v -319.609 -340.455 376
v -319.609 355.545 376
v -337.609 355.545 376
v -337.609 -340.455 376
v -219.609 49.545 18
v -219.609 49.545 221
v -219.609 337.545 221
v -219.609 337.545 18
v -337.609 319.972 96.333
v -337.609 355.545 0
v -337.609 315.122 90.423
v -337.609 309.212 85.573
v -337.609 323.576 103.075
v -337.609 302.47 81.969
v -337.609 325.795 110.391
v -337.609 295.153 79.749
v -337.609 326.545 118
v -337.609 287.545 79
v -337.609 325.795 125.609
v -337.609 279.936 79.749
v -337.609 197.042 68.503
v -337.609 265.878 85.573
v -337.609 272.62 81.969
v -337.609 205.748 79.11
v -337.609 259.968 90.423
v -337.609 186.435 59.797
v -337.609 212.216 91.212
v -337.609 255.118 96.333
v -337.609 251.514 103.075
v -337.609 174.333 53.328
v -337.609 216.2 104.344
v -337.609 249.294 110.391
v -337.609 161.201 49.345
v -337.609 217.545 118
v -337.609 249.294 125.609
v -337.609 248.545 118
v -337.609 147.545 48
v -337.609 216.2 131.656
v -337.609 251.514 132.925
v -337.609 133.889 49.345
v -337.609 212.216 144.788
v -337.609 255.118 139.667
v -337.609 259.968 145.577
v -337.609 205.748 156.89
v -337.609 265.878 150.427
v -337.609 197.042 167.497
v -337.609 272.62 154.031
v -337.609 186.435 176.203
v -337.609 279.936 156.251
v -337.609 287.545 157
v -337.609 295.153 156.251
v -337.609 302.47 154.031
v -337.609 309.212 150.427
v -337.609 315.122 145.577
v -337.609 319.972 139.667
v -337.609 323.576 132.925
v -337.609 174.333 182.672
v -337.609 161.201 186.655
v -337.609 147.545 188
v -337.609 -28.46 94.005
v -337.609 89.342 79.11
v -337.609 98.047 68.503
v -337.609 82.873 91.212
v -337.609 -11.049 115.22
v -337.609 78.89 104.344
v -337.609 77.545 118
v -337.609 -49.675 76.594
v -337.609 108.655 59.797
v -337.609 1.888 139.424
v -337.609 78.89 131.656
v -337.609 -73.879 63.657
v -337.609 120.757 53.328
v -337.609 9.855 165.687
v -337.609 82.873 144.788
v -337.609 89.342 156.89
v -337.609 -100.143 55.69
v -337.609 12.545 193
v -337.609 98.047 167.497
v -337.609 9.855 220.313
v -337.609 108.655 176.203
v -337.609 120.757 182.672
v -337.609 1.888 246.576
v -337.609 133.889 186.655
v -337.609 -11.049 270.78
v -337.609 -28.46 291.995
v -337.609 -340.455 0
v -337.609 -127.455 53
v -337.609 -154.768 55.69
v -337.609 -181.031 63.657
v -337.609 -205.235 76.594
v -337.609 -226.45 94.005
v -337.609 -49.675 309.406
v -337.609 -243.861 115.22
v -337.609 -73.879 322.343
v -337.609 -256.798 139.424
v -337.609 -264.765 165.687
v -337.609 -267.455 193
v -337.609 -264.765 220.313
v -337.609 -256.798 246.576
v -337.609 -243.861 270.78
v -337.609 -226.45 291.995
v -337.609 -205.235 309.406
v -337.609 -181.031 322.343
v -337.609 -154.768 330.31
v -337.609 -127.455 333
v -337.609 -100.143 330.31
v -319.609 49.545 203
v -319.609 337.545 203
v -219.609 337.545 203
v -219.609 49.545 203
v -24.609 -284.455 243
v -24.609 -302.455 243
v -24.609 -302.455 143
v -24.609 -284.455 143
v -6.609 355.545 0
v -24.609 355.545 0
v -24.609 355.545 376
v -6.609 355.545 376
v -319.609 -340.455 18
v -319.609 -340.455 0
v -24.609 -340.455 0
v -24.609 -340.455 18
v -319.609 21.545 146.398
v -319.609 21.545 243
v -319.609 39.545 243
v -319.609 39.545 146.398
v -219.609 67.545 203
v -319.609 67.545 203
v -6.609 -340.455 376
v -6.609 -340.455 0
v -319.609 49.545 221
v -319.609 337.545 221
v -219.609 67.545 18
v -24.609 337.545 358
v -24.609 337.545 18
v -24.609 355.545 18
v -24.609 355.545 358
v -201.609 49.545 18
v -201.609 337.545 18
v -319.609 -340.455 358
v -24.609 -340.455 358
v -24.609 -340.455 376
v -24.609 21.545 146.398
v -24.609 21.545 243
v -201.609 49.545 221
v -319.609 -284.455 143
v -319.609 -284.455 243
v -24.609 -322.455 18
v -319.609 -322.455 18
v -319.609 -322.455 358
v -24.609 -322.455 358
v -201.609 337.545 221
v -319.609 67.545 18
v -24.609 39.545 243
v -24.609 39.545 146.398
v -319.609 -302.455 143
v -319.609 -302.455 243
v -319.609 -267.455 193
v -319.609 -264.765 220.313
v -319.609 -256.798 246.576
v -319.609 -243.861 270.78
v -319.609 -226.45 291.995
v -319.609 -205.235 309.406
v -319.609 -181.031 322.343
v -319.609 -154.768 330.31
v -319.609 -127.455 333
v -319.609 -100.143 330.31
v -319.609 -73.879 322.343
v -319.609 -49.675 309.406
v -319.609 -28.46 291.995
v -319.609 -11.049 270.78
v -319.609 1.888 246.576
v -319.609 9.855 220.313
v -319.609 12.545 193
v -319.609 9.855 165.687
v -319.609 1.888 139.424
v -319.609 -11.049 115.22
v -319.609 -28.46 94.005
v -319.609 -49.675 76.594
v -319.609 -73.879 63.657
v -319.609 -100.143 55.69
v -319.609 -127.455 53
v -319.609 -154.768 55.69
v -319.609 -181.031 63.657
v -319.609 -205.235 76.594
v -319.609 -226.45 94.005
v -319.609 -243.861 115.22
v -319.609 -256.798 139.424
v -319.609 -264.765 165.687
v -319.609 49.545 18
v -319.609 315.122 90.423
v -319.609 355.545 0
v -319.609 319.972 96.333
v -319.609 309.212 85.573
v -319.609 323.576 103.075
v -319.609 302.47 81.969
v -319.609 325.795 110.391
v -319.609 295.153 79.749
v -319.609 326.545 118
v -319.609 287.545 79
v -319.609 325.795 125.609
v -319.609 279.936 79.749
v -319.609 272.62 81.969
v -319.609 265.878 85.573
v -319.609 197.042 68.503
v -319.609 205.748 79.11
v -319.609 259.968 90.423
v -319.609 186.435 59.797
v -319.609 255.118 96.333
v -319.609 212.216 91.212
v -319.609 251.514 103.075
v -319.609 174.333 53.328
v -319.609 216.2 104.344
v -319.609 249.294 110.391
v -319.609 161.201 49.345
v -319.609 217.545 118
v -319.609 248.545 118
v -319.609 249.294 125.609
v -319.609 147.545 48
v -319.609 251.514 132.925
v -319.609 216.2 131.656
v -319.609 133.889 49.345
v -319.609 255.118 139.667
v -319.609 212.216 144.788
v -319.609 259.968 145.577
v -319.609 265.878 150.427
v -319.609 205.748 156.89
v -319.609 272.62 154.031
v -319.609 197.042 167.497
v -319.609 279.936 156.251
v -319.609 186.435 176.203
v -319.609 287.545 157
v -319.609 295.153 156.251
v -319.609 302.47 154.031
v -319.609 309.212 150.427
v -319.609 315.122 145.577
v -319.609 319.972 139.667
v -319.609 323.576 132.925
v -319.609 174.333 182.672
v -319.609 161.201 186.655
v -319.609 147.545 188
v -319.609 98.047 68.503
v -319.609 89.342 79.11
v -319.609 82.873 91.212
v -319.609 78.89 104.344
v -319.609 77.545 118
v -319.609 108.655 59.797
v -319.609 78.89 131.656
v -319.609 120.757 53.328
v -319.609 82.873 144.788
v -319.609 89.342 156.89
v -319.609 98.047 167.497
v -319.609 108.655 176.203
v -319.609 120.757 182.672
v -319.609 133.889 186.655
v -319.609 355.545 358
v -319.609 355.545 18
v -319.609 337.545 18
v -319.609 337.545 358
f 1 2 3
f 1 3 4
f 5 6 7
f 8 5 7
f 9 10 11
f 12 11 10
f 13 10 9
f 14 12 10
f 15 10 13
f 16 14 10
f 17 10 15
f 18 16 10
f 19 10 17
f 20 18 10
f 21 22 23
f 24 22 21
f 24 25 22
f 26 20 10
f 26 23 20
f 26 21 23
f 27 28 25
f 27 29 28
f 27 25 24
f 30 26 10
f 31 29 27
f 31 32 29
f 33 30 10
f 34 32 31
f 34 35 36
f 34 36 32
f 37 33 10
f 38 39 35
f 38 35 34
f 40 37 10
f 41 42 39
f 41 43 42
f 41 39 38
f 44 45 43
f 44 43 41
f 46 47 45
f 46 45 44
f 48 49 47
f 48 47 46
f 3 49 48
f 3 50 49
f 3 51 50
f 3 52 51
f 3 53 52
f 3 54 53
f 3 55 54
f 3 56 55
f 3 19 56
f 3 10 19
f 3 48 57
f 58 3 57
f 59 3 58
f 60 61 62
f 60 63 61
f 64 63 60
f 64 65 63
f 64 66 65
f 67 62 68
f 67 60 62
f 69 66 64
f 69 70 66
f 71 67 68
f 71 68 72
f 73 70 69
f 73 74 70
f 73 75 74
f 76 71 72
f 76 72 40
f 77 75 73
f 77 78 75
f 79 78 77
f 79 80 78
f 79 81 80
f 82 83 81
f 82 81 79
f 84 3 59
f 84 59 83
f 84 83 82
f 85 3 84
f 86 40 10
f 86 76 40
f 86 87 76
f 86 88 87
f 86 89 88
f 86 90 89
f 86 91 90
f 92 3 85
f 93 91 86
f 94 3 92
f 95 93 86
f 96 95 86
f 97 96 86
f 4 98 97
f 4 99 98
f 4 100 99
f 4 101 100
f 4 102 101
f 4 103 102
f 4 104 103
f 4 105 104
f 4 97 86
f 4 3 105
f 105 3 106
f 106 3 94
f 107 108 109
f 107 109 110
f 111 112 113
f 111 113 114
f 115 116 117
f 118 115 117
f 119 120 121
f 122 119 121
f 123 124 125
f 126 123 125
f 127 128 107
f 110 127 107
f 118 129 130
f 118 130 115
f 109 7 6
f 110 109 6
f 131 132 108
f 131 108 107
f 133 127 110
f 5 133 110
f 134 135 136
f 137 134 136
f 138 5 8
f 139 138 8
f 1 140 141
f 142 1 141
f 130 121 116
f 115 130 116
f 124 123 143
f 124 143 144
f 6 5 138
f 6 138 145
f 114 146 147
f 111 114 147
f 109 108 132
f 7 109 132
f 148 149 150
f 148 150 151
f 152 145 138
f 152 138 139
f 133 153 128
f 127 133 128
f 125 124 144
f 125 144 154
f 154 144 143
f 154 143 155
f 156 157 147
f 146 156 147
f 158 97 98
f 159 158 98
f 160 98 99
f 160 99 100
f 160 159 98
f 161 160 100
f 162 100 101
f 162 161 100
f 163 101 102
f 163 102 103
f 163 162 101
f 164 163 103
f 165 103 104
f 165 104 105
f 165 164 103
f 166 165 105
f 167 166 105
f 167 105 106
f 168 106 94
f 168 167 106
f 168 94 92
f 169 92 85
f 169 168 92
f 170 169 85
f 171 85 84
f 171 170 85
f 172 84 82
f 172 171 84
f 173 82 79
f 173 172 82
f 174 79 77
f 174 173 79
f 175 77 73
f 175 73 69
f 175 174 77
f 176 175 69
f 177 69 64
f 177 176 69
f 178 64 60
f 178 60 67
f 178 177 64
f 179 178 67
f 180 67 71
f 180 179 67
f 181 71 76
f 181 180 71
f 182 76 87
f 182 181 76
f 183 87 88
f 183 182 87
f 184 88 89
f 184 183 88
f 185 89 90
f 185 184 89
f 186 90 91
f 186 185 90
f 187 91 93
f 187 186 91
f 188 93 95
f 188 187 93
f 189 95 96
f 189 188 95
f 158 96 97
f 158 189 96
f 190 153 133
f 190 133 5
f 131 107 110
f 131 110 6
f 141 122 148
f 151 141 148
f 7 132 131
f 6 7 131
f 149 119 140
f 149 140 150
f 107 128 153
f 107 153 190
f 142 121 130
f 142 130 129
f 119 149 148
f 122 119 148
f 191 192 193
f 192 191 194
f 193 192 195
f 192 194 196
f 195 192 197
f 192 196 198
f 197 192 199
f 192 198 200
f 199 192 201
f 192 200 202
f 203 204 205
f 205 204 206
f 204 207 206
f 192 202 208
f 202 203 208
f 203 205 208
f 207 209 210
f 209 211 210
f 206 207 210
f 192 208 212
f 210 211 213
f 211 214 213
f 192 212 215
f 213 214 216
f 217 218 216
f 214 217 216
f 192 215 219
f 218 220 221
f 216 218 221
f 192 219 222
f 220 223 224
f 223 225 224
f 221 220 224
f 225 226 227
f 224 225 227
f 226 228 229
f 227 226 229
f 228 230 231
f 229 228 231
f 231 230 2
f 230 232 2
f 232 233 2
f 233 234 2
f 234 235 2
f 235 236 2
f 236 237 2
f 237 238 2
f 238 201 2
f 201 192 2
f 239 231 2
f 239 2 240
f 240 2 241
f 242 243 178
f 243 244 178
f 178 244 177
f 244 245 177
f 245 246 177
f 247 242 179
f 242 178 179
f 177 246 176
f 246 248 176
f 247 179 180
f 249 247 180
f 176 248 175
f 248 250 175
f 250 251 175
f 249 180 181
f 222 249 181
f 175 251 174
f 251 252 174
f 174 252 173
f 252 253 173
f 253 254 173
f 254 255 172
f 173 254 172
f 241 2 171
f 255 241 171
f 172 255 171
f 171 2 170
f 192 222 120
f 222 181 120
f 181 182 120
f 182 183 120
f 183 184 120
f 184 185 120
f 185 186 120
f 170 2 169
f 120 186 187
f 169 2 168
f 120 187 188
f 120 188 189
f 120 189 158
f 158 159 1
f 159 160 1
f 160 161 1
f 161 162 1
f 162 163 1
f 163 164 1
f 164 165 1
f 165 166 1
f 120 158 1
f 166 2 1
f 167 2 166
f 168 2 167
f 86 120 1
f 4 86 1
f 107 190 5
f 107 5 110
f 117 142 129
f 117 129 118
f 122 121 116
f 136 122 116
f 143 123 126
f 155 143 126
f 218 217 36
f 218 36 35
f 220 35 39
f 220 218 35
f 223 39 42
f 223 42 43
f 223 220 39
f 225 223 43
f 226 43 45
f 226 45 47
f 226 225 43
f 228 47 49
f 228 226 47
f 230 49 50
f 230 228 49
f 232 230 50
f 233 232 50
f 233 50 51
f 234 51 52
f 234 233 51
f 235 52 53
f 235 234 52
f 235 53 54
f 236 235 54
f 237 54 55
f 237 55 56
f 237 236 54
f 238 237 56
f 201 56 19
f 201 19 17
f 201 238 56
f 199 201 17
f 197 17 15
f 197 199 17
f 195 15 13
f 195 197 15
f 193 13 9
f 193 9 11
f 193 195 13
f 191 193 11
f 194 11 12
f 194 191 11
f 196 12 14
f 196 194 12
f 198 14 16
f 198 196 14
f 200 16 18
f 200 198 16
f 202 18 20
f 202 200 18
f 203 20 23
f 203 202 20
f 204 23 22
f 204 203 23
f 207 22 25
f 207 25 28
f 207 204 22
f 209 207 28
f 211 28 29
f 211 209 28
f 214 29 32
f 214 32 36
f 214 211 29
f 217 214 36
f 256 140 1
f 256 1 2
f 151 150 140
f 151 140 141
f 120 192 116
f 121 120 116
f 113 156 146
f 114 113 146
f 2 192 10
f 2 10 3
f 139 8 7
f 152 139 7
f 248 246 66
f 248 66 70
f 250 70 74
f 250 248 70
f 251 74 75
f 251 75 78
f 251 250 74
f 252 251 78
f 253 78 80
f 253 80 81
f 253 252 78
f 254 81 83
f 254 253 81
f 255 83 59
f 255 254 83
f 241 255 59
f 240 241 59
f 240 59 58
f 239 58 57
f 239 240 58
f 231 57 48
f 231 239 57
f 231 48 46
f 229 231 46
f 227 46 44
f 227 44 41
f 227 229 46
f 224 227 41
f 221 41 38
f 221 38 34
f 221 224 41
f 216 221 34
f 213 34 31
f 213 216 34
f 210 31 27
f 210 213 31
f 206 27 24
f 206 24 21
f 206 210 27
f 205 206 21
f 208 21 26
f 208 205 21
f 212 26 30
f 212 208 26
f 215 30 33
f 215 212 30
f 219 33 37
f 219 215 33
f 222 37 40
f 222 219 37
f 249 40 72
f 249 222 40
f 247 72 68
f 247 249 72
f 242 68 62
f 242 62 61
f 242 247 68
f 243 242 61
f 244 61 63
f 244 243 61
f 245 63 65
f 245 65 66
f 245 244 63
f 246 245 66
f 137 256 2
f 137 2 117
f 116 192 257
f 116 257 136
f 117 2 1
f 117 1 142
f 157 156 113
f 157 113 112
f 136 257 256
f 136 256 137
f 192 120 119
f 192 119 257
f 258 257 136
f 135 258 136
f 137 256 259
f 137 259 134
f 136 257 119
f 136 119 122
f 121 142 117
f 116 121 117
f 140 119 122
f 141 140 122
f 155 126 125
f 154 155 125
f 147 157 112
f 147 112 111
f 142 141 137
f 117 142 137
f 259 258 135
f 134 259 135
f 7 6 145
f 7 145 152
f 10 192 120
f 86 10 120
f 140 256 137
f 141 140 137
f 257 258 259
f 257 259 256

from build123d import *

# Parameters (mm, degrees)
F0_W      = 295
F0_H      = 696
F1_DEPTH  = 18
F2_W      = 295
F2_H      = 18
F3_DEPTH  = 340
F4_W      = 288
F4_H      = 18
F5_DEPTH  = 100
F6_W      = 18
F6_H      = 185
F7_DEPTH  = 100
F8_W      = 696
F8_H      = 376
F9_DEPTH  = 18
F10_W     = 295
F10_H     = 696
F11_DEPTH = 18
F12_W     = 696
F12_H     = 376
F12_R     = 39
F12_R_2   = 70
F12_R_3   = 140
F13_DEPTH = 18
F14_W     = 18
F14_H     = 100
F15_DEPTH = 295
F14_H_2   = 96.6019383799
F16_W     = 288
F16_H     = 203
F17_DEPTH = 18


with BuildPart() as f1:
    # F0 (on Top) → F1 (new body)
    with BuildSketch(Plane.XY):
        with Locations((-172.1087222384, 7.5448482484)):
            Rectangle(F0_W, F0_H)
    extrude(amount=F1_DEPTH)


with BuildPart() as f3:
    # F2 (on face) → F3 (new body)
    with BuildSketch(Plane.XY.offset(18)):
        with Locations((-172.1087222384, -331.4551517516)):
            Rectangle(F2_W, F2_H)
    extrude(amount=F3_DEPTH)


with BuildPart() as f3b:
    # F2 (on face) → F3, piece 2 (new body)
    with BuildSketch(Plane.XY.offset(18)):
        with Locations((-172.1087222384, 346.5448482484)):
            Rectangle(F2_W, F2_H)
    extrude(amount=F3_DEPTH)


with BuildPart() as f5:
    # F4 (on face) → F5 (new body)
    with BuildSketch(Plane(origin=(-319.6087222384, 0, 0), x_dir=(0, -1, 0), z_dir=(-1, 0, 0))):
        with Locations((-193.5448482484, 212)):
            Rectangle(F4_W, F4_H)
    extrude(amount=-F5_DEPTH)


with BuildPart() as f7:
    # F6 (on face) → F7 (new body)
    with BuildSketch(Plane(origin=(-319.6087222384, 0, 0), x_dir=(0, -1, 0), z_dir=(-1, 0, 0))):
        with Locations((-58.5448482484, 110.5)):
            Rectangle(F6_W, F6_H)
    extrude(amount=-F7_DEPTH)


with BuildPart() as f9:
    # F8 (on face) → F9 (new body)
    with BuildSketch(Plane.YZ.offset(-24.6087222384)):
        with Locations((7.5448482484, 188)):
            Rectangle(F8_W, F8_H)
    extrude(amount=F9_DEPTH)


with BuildPart() as f11:
    # F10 (on face) → F11 (new body)
    with BuildSketch(Plane.XY.offset(358)):
        with Locations((-172.1087222384, 7.5448482484)):
            Rectangle(F10_W, F10_H)
    extrude(amount=F11_DEPTH)


with BuildPart() as f13:
    # F12 (on face) → F13 (new body)
    with BuildSketch(Plane(origin=(-319.6087222384, 0, 0), x_dir=(0, -1, 0), z_dir=(-1, 0, 0))):
        with Locations((-7.5448482484, 188)):
            Rectangle(F12_W, F12_H)
        with Locations((-287.5448482484, 118)):
            Circle(F12_R, mode=Mode.SUBTRACT)
        with Locations((-147.5448482484, 118)):
            Circle(F12_R_2, mode=Mode.SUBTRACT)
        with Locations((127.4551517516, 193)):
            Circle(F12_R_3, mode=Mode.SUBTRACT)
    extrude(amount=F13_DEPTH)


with BuildPart() as f15:
    # F14 (on face) → F15 (new body, through all)
    with BuildSketch(Plane.YZ.offset(-319.6087222384)):
        with Locations((-293.4551517516, 193)):
            Rectangle(F14_W, F14_H)
    extrude(amount=F15_DEPTH)


with BuildPart() as f15b:
    # F14 (on face) → F15, piece 2 (new body, through all)
    with BuildSketch(Plane.YZ.offset(-319.6087222384)):
        with Locations((30.5448482484, 194.69903081)):
            Rectangle(F14_W, F14_H_2)
    extrude(amount=F15_DEPTH)


with BuildPart() as f17:
    # F16 (on face) → F17 (new body)
    with BuildSketch(Plane.YZ.offset(-219.6087222384)):
        with Locations((193.5448482484, 119.5)):
            Rectangle(F16_W, F16_H)
    extrude(amount=F17_DEPTH)


solid = Compound([f1.part, f3.part, f3b.part, f5.part, f7.part, f9.part, f11.part, f13.part, f15.part, f15b.part, f17.part])
